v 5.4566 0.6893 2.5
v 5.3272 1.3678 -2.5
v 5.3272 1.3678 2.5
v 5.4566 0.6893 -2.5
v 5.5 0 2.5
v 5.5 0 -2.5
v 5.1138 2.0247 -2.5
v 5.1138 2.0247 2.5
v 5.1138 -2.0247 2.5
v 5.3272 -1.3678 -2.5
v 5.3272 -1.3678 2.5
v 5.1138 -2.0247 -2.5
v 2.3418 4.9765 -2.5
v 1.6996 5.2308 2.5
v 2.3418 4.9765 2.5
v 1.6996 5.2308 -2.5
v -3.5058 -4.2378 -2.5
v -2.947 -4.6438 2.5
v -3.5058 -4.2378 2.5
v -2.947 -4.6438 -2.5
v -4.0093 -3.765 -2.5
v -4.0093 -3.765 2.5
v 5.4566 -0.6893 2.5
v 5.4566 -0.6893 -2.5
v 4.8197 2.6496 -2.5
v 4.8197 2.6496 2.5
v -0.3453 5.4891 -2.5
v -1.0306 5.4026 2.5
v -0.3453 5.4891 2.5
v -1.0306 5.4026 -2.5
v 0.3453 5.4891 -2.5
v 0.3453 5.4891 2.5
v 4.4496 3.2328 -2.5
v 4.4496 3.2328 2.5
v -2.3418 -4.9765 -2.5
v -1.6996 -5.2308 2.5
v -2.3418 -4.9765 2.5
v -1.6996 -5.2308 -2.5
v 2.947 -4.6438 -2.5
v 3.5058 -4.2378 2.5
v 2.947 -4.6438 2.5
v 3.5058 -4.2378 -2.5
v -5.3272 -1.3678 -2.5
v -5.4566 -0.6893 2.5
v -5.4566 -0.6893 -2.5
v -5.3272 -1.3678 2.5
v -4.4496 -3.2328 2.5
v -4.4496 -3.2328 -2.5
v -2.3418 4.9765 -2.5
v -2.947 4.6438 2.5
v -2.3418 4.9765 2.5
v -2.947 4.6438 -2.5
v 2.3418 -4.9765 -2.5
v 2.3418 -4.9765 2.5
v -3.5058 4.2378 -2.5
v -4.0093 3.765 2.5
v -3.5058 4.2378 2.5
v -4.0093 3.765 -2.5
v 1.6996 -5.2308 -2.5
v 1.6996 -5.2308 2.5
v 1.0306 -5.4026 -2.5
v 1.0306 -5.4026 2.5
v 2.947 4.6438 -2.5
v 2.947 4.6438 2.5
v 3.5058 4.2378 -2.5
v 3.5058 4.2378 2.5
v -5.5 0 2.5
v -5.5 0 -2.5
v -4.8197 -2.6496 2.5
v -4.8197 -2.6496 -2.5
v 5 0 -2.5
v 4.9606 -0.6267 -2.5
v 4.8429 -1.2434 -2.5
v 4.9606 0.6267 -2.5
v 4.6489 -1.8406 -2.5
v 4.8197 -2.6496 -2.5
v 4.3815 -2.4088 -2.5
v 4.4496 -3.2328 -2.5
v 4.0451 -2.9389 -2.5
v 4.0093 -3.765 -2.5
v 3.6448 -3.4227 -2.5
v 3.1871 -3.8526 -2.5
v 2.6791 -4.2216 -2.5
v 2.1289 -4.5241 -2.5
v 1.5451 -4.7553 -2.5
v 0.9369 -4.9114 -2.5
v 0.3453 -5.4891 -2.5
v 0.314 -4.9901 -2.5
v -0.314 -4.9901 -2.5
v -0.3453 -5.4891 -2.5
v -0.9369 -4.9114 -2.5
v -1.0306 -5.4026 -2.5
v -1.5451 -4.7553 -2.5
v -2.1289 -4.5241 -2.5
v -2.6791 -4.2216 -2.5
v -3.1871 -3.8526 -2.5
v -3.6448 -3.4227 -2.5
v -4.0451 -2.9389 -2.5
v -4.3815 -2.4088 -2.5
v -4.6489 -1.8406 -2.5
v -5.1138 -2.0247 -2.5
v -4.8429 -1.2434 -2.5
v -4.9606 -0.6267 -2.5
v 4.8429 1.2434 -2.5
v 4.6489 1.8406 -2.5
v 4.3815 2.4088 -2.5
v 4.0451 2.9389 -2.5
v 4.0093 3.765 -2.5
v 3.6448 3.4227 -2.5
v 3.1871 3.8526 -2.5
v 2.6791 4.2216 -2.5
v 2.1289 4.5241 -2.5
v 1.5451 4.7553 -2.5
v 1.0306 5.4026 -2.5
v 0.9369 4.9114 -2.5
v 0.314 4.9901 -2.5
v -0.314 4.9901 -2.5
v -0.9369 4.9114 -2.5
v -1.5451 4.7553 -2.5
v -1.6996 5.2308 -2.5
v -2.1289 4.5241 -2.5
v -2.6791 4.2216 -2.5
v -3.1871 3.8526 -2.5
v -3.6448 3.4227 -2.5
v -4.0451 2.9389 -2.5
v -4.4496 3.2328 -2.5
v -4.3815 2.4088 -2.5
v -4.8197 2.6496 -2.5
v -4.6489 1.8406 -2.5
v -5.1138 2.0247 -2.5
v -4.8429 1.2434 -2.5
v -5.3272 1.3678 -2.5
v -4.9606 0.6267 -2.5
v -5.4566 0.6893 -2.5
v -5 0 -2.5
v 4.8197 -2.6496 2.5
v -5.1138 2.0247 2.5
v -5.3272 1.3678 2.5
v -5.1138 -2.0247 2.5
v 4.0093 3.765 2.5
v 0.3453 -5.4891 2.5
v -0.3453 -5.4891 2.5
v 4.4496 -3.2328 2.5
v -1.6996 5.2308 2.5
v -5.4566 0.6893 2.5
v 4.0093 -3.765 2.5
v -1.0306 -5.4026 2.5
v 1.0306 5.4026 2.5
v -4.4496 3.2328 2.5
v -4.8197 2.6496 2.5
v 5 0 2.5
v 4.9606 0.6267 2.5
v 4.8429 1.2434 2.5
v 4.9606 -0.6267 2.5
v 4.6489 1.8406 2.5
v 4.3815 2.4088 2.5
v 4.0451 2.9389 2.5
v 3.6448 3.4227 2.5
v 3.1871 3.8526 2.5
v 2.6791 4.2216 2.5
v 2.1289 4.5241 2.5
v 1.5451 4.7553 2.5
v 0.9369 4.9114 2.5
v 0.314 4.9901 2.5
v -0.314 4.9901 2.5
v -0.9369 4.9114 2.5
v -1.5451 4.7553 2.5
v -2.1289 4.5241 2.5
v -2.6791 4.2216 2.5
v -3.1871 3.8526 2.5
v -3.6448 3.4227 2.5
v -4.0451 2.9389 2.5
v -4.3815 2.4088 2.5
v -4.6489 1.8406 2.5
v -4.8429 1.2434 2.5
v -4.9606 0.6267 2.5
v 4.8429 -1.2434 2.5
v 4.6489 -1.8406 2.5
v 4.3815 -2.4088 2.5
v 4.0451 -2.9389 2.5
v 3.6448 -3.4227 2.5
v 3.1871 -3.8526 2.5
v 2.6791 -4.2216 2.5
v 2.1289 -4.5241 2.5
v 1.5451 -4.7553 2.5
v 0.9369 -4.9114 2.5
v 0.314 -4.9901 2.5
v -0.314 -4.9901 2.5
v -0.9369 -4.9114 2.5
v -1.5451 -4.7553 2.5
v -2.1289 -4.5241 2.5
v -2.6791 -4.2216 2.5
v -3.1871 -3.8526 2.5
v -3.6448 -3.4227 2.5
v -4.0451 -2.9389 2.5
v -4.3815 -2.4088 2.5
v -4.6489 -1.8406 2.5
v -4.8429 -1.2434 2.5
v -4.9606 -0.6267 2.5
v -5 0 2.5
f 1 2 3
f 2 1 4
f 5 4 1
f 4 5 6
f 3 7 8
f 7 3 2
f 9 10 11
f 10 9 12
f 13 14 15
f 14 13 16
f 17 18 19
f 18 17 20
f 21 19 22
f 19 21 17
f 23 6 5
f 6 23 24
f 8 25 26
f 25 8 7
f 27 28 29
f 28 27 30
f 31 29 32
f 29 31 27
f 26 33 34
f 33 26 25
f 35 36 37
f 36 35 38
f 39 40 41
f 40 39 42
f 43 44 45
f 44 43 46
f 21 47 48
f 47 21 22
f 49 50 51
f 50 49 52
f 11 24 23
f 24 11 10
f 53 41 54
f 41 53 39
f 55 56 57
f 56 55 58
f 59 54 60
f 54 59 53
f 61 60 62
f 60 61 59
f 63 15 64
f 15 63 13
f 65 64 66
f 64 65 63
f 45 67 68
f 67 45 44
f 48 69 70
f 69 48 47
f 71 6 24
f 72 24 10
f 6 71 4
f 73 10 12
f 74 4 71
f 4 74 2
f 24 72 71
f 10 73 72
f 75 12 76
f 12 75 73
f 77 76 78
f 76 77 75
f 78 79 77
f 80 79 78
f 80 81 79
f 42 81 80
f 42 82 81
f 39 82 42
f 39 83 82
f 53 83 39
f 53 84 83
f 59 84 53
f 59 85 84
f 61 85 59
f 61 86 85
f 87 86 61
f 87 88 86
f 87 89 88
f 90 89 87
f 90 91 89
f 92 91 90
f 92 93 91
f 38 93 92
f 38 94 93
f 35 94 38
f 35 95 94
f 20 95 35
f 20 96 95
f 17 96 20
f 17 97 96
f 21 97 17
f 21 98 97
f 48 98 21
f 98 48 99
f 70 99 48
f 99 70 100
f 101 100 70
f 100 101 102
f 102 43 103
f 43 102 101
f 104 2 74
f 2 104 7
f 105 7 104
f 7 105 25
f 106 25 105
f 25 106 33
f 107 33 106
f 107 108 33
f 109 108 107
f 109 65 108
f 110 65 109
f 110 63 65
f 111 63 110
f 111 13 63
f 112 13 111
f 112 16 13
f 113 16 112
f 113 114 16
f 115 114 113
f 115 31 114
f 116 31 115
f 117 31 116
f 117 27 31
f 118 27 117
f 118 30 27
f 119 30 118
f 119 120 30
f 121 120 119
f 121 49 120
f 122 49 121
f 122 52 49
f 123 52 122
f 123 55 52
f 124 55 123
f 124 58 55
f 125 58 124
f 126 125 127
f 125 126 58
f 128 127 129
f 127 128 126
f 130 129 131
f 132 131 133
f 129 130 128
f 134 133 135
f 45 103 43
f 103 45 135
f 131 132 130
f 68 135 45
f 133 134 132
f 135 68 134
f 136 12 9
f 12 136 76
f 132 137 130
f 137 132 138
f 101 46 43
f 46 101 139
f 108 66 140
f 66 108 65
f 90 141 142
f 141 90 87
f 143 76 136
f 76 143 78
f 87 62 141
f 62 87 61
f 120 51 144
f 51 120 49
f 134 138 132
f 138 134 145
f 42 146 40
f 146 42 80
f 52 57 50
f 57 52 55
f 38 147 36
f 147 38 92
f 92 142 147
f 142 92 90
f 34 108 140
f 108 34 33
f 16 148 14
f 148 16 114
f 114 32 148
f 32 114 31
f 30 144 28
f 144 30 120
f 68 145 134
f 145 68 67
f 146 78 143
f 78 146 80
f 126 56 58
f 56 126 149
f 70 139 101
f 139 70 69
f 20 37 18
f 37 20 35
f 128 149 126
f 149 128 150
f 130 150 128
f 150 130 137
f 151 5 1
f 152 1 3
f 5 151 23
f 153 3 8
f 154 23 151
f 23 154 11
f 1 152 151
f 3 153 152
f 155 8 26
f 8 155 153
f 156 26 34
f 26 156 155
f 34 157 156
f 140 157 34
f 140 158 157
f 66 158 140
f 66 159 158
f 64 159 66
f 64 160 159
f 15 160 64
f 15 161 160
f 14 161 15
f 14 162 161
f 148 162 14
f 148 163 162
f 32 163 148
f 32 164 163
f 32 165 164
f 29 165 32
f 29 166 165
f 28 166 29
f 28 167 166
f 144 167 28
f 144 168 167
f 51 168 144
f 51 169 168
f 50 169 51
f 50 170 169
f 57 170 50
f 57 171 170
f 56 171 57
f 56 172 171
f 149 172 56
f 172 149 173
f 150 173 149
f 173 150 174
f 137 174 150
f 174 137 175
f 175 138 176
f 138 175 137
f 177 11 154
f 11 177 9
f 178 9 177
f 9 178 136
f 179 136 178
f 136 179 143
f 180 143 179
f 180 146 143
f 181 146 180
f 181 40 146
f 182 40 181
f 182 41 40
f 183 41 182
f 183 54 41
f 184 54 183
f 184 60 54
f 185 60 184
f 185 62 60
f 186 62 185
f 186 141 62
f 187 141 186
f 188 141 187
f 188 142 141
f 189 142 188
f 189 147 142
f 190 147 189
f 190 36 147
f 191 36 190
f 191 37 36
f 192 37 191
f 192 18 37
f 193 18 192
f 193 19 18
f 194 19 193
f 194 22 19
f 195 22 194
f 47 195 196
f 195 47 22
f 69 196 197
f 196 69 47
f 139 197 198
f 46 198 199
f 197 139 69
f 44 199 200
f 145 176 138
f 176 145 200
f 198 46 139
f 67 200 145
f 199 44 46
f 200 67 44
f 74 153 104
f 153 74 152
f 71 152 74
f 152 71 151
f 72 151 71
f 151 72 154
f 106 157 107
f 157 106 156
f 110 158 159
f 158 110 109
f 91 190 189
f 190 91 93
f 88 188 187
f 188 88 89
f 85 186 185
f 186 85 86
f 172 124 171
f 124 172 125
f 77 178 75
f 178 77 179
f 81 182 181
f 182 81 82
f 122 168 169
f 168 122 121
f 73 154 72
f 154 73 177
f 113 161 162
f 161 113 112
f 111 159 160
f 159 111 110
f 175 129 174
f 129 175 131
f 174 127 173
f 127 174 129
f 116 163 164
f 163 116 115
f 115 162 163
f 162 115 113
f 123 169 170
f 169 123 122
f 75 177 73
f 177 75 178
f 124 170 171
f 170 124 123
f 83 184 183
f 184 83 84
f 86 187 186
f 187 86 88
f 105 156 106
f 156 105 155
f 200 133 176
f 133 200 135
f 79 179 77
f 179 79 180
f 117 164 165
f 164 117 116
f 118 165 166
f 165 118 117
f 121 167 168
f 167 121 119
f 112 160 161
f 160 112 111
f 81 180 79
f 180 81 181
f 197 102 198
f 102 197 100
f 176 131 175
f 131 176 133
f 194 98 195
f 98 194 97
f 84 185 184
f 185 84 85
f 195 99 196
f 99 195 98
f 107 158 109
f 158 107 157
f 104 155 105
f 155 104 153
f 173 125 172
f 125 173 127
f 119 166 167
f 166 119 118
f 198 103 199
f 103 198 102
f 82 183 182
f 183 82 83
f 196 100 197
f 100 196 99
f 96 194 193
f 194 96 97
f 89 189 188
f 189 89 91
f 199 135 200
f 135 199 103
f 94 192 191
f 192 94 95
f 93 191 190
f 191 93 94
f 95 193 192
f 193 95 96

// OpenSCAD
$fn = 50;


difference() {
	union() {
		translate(v = [0, 0, -2.5000000000]) {
			cylinder(h = 5, r = 5.5000000000);
		}
	}
	union() {
		translate(v = [0, 0, -100.0000000000]) {
			cylinder(h = 200, r = 5.0000000000);
		}
	}
}
